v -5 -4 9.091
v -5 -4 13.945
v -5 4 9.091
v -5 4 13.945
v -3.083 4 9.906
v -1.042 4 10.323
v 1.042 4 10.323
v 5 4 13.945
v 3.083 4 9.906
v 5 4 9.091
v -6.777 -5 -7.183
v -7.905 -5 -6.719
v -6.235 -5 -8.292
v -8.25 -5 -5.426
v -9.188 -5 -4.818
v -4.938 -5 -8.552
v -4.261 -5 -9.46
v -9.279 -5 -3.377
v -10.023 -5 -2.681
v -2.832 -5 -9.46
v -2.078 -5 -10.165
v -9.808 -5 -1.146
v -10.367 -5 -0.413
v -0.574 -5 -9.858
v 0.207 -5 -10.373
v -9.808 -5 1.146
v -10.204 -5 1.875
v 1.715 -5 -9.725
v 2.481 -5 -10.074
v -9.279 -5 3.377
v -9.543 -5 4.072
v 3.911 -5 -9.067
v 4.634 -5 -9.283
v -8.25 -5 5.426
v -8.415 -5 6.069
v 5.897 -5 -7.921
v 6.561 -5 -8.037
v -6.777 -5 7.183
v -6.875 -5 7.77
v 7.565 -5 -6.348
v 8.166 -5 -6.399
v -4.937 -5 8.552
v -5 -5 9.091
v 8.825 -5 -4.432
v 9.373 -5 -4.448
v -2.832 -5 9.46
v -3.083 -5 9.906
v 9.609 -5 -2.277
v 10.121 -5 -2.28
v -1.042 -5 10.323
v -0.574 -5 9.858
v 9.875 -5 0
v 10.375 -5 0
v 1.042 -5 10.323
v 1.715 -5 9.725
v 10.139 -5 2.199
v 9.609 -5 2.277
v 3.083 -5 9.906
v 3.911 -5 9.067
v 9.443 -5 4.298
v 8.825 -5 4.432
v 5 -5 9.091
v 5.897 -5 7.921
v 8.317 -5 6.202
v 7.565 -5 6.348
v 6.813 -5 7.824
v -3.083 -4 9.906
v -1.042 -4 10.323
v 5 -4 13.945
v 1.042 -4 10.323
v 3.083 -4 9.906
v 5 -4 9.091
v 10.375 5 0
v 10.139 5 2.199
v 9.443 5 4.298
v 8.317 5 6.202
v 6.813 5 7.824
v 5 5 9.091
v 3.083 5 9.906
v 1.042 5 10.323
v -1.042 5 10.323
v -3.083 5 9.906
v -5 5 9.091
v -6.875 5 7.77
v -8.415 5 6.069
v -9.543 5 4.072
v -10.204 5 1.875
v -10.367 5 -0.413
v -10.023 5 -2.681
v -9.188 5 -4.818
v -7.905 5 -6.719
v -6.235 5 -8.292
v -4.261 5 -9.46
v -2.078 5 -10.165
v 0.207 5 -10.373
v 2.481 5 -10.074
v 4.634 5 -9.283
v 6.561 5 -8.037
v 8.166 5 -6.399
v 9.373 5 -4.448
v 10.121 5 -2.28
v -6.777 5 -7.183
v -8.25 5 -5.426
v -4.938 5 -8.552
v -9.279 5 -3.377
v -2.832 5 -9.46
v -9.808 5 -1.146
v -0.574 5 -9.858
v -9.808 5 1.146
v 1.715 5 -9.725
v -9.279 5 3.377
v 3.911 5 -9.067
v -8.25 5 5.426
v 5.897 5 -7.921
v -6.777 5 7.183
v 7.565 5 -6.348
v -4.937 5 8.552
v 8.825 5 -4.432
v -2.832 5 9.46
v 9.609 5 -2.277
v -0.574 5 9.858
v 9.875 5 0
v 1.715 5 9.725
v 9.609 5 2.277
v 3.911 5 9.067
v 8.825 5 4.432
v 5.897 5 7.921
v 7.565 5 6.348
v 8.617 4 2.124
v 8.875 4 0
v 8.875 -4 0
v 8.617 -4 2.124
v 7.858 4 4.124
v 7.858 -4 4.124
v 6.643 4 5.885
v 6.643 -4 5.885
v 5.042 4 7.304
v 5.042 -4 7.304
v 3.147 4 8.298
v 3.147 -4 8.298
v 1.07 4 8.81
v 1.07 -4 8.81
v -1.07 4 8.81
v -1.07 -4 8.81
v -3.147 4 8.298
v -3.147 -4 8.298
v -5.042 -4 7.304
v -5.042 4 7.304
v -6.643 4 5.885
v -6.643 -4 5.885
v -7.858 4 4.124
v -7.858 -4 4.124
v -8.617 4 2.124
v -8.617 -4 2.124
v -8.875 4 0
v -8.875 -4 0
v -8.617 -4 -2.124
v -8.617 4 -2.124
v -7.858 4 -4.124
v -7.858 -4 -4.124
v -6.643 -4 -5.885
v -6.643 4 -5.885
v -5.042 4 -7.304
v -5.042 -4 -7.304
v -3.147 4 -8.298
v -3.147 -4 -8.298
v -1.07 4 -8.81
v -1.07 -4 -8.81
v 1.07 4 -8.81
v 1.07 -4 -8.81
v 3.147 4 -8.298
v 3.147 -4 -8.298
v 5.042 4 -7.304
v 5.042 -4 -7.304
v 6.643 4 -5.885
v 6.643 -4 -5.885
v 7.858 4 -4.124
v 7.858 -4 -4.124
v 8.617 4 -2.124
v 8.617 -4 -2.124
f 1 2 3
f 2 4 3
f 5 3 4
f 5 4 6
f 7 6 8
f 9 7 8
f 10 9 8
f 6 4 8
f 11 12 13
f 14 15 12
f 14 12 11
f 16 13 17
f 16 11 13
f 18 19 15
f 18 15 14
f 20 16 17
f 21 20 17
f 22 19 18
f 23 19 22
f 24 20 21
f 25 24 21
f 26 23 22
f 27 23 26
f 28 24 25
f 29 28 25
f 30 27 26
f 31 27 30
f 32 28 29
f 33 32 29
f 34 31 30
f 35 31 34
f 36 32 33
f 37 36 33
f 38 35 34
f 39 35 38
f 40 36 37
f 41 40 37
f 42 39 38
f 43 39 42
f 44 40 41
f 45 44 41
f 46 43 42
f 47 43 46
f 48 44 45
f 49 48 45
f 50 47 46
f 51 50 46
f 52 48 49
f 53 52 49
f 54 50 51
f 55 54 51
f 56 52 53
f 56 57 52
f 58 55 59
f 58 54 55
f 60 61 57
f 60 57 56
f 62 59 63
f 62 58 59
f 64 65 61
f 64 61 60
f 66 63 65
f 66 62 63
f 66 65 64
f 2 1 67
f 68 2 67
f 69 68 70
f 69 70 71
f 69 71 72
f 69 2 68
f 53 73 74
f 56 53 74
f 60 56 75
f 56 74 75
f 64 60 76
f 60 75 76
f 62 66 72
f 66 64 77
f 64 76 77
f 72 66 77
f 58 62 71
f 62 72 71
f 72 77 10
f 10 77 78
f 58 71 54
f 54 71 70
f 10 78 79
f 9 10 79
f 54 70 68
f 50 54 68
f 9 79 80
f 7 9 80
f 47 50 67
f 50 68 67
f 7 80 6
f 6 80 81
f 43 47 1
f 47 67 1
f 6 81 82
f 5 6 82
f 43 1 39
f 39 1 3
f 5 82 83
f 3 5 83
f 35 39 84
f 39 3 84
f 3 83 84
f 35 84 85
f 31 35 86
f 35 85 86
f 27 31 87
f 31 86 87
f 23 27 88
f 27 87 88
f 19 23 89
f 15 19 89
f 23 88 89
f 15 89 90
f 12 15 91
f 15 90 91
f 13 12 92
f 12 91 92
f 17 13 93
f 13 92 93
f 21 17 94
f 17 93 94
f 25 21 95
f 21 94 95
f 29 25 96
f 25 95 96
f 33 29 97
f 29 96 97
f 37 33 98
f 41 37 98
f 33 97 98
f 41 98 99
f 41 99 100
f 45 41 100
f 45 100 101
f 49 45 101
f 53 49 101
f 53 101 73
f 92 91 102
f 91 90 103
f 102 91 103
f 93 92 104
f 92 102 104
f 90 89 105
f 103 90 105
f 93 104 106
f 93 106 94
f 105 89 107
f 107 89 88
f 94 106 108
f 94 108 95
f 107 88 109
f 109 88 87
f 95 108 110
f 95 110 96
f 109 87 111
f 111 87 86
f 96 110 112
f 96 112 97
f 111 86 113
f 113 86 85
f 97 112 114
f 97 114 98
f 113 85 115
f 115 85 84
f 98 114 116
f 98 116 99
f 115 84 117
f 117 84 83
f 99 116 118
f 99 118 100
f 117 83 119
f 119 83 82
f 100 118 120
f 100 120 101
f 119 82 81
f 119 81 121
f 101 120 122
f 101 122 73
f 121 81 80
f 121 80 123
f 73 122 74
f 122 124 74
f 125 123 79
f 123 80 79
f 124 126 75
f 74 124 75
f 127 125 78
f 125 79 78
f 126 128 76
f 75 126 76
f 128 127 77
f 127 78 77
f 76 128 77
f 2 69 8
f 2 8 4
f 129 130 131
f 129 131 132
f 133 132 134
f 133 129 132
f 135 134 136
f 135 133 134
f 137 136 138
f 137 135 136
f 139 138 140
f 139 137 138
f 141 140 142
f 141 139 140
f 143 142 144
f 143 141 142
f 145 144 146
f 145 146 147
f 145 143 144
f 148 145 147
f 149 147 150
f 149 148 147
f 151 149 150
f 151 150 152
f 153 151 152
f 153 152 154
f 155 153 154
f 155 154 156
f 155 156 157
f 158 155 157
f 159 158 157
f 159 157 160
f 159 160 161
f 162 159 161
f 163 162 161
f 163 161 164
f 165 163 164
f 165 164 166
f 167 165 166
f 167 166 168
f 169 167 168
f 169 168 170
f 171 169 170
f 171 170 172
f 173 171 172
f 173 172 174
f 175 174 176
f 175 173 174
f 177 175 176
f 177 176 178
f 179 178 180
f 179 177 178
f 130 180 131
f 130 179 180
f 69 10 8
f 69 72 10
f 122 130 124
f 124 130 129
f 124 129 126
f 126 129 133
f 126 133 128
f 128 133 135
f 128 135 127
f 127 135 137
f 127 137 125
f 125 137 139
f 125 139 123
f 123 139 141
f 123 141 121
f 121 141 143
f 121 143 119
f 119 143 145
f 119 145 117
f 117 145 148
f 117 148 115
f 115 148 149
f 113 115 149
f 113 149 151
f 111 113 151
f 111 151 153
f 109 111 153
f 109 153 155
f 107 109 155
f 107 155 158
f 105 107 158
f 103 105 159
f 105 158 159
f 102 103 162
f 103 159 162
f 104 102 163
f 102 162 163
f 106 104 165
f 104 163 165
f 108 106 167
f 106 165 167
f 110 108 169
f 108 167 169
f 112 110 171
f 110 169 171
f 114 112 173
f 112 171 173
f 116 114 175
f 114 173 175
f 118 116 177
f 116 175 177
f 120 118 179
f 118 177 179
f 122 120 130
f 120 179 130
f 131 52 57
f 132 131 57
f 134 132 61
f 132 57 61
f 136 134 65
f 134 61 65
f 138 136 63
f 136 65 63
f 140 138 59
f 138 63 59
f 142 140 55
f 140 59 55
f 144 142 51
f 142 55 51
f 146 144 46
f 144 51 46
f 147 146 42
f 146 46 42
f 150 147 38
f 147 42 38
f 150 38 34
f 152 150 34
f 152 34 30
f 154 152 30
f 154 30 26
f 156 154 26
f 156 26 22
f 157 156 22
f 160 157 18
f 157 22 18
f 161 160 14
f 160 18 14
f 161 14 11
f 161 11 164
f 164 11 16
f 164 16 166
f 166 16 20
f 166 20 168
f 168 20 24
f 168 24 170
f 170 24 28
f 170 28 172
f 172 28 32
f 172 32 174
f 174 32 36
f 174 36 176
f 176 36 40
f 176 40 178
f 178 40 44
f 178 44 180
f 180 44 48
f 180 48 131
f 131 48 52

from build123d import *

# Parameters (mm, degrees)
F0_R          = 8.875
F1_DEPTH      = 5
F1_DEPTH_BACK = 5
F2_DEPTH      = 4
F2_DEPTH_BACK = 4
F3_SIZE       = 1


# Not quite as in the source:
# - a feature names something its author has since deleted; it is built from what else it names


with BuildPart() as f1:
    # F0 (on Front) → F1 (new body, two sides)
    with BuildSketch(Plane.XZ) as f1_sk:
        with BuildLine():
            ThreePointArc((-5, 9.0906889178), (-5.2804178338, -8.9307229551), (10.375, 0))
            ThreePointArc((10.375, 0), (8.9307229551, 5.2804178338), (5, 9.0906889178))
            Line((5, 9.0906889178), (5, 8.9453239366))
            Line((5, 8.9453239366), (-5, 8.9453239366))
            Line((-5, 8.9453239366), (-5, 9.0906889178))
        make_face()
        Circle(F0_R, mode=Mode.SUBTRACT)
        with BuildLine():
            Line((5, 8.9453239366), (5, 9.0906889178))
            ThreePointArc((5, 9.0906889178), (0, 10.375), (-5, 9.0906889178))
            Line((-5, 9.0906889178), (-5, 8.9453239366))
            Line((-5, 8.9453239366), (5, 8.9453239366))
        make_face()
    extrude(amount=F1_DEPTH)
    extrude(f1_sk.sketch, amount=-F1_DEPTH_BACK)

    # F0 (on Front) → F2 (join, two sides)
    with BuildSketch(Plane.XZ) as f2_sk:
        with BuildLine():
            ThreePointArc((-5, 9.0906889178), (0, 10.375), (5, 9.0906889178))
            Line((5, 9.0906889178), (5, 13.9453239366))
            Line((5, 13.9453239366), (-5, 13.9453239366))
            Line((-5, 13.9453239366), (-5, 9.0906889178))
        make_face()
    extrude(amount=F2_DEPTH)
    extrude(f2_sk.sketch, amount=-F2_DEPTH_BACK)

    # F3
    f3_edges = [f1.edges().sort_by_distance(p)[0] for p in [
        (-8.875, 5, 0),
        (-8.875, -5, 0),
    ]]
    chamfer(f3_edges, length=F3_SIZE)


solid = f1.part
